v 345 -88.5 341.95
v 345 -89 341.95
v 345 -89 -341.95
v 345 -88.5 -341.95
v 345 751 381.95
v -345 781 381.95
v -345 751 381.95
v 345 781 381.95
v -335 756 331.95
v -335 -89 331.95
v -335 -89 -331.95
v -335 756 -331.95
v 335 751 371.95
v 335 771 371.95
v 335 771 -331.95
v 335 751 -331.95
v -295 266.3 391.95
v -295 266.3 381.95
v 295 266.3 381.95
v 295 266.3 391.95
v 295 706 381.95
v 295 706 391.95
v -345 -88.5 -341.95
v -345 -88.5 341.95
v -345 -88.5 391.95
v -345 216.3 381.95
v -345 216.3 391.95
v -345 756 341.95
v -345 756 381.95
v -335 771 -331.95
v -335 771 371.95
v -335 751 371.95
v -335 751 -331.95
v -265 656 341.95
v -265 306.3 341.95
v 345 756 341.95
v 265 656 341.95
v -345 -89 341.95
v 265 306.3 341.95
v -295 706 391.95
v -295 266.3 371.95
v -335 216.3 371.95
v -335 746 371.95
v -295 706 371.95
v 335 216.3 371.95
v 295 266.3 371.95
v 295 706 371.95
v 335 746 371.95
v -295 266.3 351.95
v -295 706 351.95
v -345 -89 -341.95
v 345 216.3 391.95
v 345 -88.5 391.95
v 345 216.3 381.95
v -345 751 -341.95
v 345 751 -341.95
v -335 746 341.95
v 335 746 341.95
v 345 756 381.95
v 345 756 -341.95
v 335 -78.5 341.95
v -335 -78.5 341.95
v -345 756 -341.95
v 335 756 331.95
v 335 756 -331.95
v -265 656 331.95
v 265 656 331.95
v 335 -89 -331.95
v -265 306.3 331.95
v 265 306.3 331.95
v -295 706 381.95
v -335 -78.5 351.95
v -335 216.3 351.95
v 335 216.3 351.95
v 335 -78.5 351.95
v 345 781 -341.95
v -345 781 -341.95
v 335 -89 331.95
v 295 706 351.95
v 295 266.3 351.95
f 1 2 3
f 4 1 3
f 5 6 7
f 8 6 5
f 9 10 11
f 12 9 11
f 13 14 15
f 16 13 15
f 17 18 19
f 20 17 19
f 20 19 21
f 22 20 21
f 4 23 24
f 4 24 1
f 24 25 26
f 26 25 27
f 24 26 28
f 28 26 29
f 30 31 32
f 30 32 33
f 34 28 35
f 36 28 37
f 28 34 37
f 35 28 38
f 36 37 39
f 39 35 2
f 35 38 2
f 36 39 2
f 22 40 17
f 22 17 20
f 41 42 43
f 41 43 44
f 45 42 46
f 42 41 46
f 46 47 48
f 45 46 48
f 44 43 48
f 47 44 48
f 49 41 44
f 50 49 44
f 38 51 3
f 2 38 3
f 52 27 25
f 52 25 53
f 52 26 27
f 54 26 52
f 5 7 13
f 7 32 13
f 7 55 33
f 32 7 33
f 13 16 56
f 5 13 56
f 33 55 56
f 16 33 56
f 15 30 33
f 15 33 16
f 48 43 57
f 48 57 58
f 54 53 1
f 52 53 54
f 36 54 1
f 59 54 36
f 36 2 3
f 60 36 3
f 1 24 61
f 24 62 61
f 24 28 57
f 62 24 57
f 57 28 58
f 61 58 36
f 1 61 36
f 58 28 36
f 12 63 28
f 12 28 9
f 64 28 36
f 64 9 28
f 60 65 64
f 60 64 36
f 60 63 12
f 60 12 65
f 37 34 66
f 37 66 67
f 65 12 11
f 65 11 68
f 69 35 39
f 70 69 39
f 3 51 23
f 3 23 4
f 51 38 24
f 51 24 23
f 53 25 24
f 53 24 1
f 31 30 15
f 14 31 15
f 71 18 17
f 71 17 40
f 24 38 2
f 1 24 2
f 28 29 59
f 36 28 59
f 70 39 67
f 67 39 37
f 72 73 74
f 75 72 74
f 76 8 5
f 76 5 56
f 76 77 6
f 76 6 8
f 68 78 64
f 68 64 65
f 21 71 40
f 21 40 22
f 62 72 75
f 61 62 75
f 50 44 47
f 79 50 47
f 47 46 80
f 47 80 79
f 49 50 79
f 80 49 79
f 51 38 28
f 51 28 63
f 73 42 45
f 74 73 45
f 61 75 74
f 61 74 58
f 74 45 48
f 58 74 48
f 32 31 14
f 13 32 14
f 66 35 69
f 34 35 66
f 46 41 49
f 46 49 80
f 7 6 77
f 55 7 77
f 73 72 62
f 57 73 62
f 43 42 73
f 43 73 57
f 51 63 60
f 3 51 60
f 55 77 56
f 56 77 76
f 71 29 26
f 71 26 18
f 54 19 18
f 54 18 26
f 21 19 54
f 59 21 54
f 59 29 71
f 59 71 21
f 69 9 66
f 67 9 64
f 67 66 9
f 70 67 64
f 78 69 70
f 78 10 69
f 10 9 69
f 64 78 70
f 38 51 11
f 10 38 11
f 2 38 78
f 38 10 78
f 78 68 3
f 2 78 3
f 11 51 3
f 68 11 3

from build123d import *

# Parameters (mm, degrees)
SKETCH2_W                = 690
SKETCH2_H                = 683.9
BOSS_EXTRUDE1_DEPTH      = 0.5
SKETCH4_W                = 690
SKETCH4_H                = 683.9
SKETCH4_W_2              = 670
SKETCH4_H_2              = 663.9
BOSS_EXTRUDE3_DEPTH      = 845
SKETCH12_W               = 690
SKETCH12_H               = 723.9
BOSS_EXTRUDE4_DEPTH      = 10
SKETCH13_W               = 690
SKETCH13_H               = 723.9
SKETCH13_W_2             = 670
SKETCH13_H_2             = 703.9
BOSS_EXTRUDE5_DEPTH      = 30
SKETCH11_W               = 530
SKETCH11_H               = 349.7
CUT_EXTRUDE1_DEPTH       = 10
SKETCH15_W               = 690
SKETCH15_H               = 844.5
BOSS_EXTRUDE6_DEPTH      = 10
SKETCH14_W               = 690
SKETCH14_H               = 304.8
SKETCH14_W_2             = 590
SKETCH14_H_2             = 439.7
BOSS_EXTRUDE7_DEPTH      = 10
BOSS_EXTRUDE7_DEPTH_BACK = 30
SKETCH17_W               = 690
SKETCH17_H               = 844.5
SKETCH17_W_2             = 670
SKETCH17_H_2             = 824.5
BOSS_EXTRUDE8_DEPTH      = 40


with BuildPart() as part:
    # Sketch2 → Boss-Extrude1 (new body)
    with BuildSketch(Plane(origin=(0, -89, 0), x_dir=(1, 0, 0), z_dir=(0, 1, 0))):
        Rectangle(SKETCH2_W, SKETCH2_H)
    extrude(amount=BOSS_EXTRUDE1_DEPTH)


with BuildPart() as body_2:
    # Sketch4 → Boss-Extrude3 (new body)
    with BuildSketch(Plane(origin=(0, -89, 0), x_dir=(1, 0, 0), z_dir=(0, 1, 0))):
        Rectangle(SKETCH4_W, SKETCH4_H)
        Rectangle(SKETCH4_W_2, SKETCH4_H_2, mode=Mode.SUBTRACT)
    extrude(amount=BOSS_EXTRUDE3_DEPTH)

    # Sketch11 → Cut-Extrude1 (cut)
    with BuildSketch(Plane.XY.offset(341.95)):
        with Locations((0, 481.15)):
            Rectangle(SKETCH11_W, SKETCH11_H)
    extrude(amount=-CUT_EXTRUDE1_DEPTH, mode=Mode.SUBTRACT)


with BuildPart() as body_3:
    # Sketch12 → Boss-Extrude4 (new body)
    with BuildSketch(Plane(origin=(0, 781, 0), x_dir=(1, 0, 0), z_dir=(0, 1, 0))):
        with Locations((0, -20)):
            Rectangle(SKETCH12_W, SKETCH12_H)
    extrude(amount=-BOSS_EXTRUDE4_DEPTH)

    # Sketch13 → Boss-Extrude5 (add)
    with BuildSketch(Plane(origin=(0, 781, 0), x_dir=(1, 0, 0), z_dir=(0, 1, 0))):
        with Locations((0, -20)):
            Rectangle(SKETCH13_W, SKETCH13_H)
        with Locations((0, -20)):
            Rectangle(SKETCH13_W_2, SKETCH13_H_2, mode=Mode.SUBTRACT)
    extrude(amount=-BOSS_EXTRUDE5_DEPTH)


with BuildPart() as body_4:
    # Sketch15 → Boss-Extrude6 (new body)
    with BuildSketch(Plane.XY.offset(381.95)):
        with Locations((0, 333.75)):
            Rectangle(SKETCH15_W, SKETCH15_H)
    extrude(amount=-BOSS_EXTRUDE6_DEPTH)

    # Sketch14 → Boss-Extrude7 (add, two sides)
    with BuildSketch(Plane.XY.offset(381.95)) as boss_extrude7_sk:
        with Locations((0, 63.9)):
            Rectangle(SKETCH14_W, SKETCH14_H)
        with Locations((0, 486.15)):
            Rectangle(SKETCH14_W_2, SKETCH14_H_2)
    extrude(amount=BOSS_EXTRUDE7_DEPTH)
    extrude(boss_extrude7_sk.sketch, amount=-BOSS_EXTRUDE7_DEPTH_BACK)

    # Sketch17 → Boss-Extrude8 (add)
    with BuildSketch(Plane.XY.offset(381.95)):
        with Locations((0, 333.75)):
            Rectangle(SKETCH17_W, SKETCH17_H)
        with Locations((0, 333.75)):
            Rectangle(SKETCH17_W_2, SKETCH17_H_2, mode=Mode.SUBTRACT)
    extrude(amount=-BOSS_EXTRUDE8_DEPTH)


solid = Compound([part.part, body_2.part, body_3.part, body_4.part])
